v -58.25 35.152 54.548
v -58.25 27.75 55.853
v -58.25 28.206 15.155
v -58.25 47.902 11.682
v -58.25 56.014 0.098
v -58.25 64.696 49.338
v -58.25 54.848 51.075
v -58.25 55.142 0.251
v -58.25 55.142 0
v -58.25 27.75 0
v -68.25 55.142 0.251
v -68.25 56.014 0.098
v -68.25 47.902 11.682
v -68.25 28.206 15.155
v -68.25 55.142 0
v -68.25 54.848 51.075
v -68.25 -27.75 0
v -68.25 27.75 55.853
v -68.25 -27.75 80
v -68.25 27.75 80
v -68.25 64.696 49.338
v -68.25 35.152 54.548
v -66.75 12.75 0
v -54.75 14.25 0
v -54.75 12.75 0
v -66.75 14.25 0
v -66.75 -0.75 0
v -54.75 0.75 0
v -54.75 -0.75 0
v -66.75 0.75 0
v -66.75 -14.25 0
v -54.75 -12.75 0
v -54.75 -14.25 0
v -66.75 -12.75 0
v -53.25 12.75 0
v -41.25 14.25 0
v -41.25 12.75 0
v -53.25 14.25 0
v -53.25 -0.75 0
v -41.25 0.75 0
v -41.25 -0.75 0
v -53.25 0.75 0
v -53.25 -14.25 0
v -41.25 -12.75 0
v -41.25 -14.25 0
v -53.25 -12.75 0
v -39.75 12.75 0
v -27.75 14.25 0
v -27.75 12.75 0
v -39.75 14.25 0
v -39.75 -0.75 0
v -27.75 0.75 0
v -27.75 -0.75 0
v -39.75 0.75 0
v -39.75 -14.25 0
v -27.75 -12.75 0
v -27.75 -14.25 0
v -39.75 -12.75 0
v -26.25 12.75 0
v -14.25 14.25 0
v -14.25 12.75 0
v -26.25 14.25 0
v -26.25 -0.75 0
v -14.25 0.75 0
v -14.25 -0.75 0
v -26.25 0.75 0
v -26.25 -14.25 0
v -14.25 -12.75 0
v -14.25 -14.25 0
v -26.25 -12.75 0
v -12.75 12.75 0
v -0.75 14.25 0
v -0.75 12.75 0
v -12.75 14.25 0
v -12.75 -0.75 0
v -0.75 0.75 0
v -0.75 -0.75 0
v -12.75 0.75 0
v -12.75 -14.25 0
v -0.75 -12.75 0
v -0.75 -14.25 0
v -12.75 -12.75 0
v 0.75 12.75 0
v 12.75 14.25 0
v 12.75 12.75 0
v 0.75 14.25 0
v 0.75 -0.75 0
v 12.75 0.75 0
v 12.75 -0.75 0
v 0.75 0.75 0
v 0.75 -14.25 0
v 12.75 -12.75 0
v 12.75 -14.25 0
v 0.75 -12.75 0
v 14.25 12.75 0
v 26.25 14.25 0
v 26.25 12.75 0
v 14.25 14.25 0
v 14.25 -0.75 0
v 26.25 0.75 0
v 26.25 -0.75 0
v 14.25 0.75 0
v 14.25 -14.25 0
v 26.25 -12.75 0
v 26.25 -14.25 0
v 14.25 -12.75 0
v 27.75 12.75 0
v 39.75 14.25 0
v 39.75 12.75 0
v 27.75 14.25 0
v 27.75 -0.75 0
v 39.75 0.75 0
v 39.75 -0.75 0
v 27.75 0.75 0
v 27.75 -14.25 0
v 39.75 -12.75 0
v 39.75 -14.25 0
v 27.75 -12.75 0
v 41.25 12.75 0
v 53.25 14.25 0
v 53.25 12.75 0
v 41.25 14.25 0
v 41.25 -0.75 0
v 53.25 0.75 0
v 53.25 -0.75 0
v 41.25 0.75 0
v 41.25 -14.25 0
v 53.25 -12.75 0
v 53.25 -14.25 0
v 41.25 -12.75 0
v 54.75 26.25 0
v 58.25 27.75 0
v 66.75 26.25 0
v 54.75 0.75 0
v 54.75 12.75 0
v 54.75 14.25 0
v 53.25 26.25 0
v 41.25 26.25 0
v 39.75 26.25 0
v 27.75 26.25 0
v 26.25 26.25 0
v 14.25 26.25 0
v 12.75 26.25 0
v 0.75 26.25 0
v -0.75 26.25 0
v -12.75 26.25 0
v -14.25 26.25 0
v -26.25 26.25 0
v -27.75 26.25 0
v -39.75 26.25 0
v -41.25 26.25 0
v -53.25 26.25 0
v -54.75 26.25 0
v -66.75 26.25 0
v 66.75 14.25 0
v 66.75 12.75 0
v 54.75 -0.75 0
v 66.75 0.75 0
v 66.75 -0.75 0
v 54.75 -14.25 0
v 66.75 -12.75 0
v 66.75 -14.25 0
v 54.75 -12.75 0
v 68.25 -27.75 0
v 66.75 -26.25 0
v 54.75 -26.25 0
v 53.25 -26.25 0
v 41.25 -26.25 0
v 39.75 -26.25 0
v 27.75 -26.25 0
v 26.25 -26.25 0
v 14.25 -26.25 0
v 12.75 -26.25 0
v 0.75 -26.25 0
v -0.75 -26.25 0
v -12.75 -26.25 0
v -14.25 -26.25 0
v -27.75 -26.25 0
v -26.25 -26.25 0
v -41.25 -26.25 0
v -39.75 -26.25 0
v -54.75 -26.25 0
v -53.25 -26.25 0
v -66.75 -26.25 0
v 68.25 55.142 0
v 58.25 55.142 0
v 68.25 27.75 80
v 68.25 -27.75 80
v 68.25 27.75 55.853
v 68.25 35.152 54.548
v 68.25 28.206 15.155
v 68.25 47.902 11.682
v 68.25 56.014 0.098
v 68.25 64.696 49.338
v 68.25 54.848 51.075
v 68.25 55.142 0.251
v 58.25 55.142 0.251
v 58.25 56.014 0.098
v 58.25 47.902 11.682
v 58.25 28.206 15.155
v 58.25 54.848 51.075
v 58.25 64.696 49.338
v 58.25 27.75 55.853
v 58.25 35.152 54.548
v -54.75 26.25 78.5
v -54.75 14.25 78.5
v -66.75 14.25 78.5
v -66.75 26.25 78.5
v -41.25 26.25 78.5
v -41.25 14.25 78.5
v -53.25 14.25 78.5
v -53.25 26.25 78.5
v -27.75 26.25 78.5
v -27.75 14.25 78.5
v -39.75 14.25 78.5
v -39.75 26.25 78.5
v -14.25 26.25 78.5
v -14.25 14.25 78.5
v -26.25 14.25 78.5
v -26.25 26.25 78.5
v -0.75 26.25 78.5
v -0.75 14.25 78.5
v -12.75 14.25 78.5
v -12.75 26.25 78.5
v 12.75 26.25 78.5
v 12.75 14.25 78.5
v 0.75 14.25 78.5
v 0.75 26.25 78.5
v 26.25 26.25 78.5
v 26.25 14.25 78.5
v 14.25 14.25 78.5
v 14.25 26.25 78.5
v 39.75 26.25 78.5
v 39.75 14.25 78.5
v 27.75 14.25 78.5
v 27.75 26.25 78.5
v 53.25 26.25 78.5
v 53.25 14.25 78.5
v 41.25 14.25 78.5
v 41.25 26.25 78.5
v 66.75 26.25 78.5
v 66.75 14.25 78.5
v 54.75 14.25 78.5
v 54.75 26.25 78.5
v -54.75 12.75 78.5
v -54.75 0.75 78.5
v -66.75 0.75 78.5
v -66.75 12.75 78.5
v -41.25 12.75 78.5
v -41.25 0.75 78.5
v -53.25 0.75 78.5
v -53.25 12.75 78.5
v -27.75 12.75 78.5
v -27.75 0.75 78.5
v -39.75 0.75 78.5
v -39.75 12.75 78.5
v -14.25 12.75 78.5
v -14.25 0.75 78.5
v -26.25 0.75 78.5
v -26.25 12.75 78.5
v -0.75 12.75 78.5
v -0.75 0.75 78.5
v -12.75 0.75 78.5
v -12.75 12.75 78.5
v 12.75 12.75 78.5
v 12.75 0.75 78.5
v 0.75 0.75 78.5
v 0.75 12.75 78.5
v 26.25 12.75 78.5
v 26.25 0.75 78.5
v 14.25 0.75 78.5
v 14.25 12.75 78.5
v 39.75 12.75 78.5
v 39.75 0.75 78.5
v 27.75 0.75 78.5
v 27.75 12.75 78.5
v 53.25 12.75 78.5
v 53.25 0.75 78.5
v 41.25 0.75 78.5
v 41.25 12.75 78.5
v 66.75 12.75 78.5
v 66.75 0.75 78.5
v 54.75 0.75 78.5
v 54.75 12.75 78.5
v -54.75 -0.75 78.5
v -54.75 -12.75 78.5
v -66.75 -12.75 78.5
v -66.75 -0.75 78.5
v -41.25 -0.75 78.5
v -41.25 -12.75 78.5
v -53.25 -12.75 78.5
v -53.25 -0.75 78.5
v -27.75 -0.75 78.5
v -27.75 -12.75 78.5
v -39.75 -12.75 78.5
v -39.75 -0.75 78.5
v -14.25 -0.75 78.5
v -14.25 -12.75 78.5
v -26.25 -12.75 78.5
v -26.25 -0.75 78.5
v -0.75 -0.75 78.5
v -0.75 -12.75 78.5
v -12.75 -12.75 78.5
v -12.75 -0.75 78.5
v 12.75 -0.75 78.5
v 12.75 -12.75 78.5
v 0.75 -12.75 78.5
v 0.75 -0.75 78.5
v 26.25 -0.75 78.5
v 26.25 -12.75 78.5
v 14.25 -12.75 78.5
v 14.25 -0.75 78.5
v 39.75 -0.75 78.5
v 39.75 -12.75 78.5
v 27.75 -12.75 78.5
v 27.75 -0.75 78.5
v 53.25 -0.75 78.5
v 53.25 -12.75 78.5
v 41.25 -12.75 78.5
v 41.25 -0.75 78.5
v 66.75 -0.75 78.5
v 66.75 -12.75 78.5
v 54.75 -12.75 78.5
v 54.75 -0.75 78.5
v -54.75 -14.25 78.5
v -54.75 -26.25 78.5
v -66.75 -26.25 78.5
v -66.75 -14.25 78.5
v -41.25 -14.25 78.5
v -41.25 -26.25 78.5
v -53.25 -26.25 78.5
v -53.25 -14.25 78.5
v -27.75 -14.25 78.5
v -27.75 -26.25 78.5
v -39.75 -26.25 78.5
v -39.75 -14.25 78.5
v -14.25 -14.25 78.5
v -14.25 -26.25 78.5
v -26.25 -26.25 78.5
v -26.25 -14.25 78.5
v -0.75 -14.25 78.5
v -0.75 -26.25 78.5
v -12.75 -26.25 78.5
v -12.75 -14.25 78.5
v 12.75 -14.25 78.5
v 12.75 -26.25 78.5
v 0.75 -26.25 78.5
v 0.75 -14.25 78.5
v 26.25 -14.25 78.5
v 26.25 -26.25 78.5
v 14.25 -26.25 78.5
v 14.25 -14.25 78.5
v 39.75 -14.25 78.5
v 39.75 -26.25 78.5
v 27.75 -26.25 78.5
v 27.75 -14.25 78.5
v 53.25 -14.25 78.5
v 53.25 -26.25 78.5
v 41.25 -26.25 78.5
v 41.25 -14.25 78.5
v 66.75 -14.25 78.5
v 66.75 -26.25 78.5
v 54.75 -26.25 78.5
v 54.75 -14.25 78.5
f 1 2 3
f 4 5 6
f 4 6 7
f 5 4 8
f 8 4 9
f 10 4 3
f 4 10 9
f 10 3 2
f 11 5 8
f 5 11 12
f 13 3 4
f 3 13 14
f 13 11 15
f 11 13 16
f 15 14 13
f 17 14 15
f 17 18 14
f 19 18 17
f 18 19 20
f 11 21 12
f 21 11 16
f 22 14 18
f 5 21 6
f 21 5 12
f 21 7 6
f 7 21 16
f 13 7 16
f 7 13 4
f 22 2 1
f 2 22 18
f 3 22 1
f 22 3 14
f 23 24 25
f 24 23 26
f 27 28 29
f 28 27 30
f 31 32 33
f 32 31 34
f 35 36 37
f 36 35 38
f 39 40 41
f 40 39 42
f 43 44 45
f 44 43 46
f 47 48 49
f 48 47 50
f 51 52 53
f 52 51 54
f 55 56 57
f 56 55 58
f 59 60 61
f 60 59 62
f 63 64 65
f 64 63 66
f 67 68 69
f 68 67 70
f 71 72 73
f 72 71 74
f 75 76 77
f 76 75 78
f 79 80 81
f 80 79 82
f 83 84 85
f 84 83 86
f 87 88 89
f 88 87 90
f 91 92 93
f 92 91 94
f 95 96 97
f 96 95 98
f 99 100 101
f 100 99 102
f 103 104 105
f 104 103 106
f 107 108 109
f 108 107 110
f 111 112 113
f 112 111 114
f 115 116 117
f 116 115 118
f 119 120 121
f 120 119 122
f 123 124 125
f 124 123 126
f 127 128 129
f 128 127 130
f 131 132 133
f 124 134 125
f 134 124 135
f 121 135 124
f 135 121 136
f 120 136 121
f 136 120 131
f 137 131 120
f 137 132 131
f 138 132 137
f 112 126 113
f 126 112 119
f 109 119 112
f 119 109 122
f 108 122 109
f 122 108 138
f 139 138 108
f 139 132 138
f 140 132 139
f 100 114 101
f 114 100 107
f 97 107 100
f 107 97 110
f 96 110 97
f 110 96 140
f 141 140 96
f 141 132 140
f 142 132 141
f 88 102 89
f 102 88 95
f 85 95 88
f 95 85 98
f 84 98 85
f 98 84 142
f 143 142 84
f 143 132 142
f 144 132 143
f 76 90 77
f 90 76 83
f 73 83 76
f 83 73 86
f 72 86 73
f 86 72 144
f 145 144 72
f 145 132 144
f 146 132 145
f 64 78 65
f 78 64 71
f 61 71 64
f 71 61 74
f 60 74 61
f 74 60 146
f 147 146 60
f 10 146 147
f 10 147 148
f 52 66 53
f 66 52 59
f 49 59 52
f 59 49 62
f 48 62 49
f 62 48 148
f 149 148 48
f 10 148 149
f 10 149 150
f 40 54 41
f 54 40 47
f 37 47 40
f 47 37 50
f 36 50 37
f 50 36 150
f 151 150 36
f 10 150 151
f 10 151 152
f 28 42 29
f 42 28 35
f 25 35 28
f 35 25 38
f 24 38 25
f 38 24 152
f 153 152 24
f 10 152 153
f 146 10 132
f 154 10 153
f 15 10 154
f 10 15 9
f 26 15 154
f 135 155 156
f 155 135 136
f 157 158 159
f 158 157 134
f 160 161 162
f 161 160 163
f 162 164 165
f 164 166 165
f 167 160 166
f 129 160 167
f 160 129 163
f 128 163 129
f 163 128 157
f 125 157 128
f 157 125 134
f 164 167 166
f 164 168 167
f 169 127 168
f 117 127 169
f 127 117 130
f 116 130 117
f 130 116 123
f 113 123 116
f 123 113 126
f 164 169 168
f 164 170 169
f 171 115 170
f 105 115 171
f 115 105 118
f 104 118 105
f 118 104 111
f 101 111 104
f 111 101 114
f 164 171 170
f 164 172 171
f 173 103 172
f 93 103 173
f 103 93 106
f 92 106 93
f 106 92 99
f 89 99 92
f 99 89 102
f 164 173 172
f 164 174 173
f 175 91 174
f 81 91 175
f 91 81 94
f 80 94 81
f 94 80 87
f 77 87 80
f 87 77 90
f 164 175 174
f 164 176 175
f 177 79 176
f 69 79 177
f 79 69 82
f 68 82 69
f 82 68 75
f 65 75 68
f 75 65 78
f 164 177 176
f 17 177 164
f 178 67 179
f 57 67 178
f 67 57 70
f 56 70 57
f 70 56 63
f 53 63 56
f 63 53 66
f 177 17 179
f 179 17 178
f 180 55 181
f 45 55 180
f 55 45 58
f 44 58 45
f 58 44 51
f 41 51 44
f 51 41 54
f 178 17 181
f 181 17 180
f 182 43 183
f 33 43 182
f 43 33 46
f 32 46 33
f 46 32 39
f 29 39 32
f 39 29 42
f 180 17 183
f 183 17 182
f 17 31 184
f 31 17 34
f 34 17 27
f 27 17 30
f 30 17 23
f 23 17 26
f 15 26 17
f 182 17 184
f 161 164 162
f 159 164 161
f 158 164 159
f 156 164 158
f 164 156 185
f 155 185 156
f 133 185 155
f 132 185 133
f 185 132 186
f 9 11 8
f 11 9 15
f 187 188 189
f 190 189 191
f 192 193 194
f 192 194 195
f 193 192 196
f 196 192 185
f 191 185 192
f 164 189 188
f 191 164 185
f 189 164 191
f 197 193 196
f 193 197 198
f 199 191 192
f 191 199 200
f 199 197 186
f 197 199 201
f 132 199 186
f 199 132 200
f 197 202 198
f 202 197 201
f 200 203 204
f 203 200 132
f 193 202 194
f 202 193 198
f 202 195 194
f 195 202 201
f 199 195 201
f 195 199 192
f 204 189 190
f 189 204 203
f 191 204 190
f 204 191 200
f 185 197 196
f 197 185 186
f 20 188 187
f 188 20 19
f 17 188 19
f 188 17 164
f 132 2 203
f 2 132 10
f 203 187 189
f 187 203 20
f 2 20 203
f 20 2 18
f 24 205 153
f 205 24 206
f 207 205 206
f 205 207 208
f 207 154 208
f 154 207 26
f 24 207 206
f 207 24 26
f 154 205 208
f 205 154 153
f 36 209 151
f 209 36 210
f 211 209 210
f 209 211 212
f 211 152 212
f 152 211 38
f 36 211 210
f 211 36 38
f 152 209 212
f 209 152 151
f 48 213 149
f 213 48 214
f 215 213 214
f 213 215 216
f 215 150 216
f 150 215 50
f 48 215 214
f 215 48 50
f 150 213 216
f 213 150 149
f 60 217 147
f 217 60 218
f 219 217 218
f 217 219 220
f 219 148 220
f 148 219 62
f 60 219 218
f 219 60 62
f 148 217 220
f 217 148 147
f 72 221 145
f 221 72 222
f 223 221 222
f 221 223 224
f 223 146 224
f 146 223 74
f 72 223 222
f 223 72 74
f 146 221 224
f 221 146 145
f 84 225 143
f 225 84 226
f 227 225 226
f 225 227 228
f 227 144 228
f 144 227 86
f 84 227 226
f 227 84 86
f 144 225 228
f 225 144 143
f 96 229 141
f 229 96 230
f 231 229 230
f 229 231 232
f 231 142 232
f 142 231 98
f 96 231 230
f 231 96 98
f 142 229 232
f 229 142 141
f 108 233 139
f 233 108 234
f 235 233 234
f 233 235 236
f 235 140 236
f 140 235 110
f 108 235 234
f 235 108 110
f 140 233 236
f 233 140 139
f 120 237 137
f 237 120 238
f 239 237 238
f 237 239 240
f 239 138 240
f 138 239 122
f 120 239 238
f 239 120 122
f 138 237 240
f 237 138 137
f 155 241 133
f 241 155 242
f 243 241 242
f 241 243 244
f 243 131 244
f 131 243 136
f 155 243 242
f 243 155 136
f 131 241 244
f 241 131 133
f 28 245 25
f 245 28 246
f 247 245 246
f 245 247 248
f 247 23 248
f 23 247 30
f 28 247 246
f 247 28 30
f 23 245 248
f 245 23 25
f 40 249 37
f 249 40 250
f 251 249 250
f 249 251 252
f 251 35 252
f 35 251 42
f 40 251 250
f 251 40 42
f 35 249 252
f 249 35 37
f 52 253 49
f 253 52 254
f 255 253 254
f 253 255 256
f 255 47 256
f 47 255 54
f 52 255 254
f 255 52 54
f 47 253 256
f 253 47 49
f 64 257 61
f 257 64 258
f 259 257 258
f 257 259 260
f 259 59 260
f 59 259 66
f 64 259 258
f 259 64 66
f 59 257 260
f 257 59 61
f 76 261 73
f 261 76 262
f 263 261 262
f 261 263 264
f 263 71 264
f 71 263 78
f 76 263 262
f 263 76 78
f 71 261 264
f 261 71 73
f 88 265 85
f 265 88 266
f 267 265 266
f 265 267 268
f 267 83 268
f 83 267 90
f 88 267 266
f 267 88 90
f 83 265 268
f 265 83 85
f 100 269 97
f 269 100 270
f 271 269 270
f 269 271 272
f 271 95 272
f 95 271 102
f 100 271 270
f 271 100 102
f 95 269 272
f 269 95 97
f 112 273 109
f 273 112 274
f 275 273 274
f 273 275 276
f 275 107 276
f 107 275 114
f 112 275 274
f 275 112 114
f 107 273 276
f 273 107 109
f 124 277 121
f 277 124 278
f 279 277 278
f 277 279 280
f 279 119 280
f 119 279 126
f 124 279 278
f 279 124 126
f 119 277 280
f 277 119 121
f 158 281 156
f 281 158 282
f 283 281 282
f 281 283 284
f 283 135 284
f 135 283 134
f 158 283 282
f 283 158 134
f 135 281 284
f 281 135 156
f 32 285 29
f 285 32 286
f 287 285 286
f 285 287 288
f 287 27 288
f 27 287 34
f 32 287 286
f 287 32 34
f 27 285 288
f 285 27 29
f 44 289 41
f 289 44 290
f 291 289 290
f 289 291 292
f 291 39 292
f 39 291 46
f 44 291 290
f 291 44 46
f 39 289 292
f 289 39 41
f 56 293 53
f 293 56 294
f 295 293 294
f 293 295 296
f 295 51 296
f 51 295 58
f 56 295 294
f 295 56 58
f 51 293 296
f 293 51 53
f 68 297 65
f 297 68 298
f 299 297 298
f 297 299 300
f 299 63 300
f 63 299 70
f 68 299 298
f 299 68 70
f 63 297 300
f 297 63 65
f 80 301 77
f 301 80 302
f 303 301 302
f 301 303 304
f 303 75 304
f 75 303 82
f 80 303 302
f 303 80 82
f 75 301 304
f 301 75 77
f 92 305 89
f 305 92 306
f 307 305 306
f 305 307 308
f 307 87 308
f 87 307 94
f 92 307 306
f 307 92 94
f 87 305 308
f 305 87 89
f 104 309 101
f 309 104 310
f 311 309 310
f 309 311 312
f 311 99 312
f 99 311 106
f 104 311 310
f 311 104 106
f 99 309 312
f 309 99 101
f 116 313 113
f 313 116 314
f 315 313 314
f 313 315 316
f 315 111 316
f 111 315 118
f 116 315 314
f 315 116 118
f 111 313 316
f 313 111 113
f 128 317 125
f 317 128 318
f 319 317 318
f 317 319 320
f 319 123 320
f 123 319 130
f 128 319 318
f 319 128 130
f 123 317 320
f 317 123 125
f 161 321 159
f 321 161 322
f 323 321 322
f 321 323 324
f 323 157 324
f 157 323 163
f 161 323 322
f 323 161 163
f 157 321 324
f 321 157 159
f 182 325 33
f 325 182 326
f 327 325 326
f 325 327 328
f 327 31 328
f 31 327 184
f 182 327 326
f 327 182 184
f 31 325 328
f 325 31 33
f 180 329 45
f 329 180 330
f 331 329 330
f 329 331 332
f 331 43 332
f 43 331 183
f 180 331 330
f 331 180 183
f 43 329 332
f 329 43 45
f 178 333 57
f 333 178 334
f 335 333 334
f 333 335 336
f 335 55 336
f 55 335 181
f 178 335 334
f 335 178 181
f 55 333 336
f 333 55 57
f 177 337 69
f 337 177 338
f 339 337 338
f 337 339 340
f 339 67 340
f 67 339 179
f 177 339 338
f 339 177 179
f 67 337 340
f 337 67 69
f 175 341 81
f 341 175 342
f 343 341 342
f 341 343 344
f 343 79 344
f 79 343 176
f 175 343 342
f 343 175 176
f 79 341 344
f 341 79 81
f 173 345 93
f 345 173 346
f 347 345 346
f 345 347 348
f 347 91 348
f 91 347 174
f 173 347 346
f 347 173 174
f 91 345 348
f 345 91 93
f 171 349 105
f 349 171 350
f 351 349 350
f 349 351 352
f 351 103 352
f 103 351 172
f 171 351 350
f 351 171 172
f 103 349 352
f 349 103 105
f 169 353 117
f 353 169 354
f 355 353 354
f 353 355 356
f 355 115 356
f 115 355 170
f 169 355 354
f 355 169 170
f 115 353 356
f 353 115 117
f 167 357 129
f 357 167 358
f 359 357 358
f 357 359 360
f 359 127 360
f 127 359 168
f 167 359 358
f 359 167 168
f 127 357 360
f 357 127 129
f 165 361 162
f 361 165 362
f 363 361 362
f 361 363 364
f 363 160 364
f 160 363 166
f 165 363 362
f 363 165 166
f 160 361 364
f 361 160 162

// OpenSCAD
// Parameteric Shelf-hanging pen holder - made to work with shelves from the Container Store
// Created by Michael S. Scherotter 
// @Synergist on Thingiverse
// @Synergist on Twitter
// @TravelArtJournalist on Instagram
// Updated 2/4/2019

// preview[view:north west, tilt:bottom]

// Number of rows
rows = 4; // [1:15]


// Number of columns
columns = 10; // [2:15]

// Size of each cell in mm 
size = 12; // [10:20]

// Thickness space between each cell in mm
innerThickness = 1.5; // [1.5:4]

// Depth of each cell in mm
depth = 80; // [40:100]

// Width of each clip in mm
clipWidth = 10; // [10:20]

// Downward tilt angle
angle = 10; // [10:14]

width = (columns * size)  + innerThickness * (columns + 1);
height = (rows * size)  + innerThickness * (rows + 1);

module model()
{
    difference() {
        union()
        {
            body();
            clip();
            translate([width-clipWidth,0,0])
            {
                clip();
            }
        }
        holes();
    }
}

orientForPrint();

module orientForPrint()
{
    rotate([180,0,0])
    {
        translate([-width/2,-height/2,-depth])
        {
            model();
        }
    }
}

module body()
{
    cube([width, height, depth], center=false);
}

module clip(){
    clipHeight = cos(angle) * 40;
    clipDepth = sin(angle) * 40;
    union()    {
        translate([0, -30, depth - clipDepth -3])    {
            rotate([-angle,0,0])            {
                union() {
                    cube([clipWidth, 40, 10], center=false);
                    translate([0,0,-40]) {                    
                        cube([clipWidth, 10, 40], center=false);
                    }
                    translate([0,30,-40]){
                        cube([clipWidth, 10, 40], center=false);
                    }
                }
            }
        }
        translate([0, -clipHeight + 12, depth - 10])
        {
            cube([clipWidth, clipHeight, 10], center=false);
        }
    }
}


module createCell(row, col)
{ 
    translate([
        innerThickness + row * (size + innerThickness), 
        innerThickness + col * (size + innerThickness), 
        innerThickness])
    {
        cube([size, size, depth], center=false);
    }
}

module holes() {
    union()
    {
        for (row = [0: rows-1])
            for (col = [0: columns-1])
                createCell(col, row);
    }
}
